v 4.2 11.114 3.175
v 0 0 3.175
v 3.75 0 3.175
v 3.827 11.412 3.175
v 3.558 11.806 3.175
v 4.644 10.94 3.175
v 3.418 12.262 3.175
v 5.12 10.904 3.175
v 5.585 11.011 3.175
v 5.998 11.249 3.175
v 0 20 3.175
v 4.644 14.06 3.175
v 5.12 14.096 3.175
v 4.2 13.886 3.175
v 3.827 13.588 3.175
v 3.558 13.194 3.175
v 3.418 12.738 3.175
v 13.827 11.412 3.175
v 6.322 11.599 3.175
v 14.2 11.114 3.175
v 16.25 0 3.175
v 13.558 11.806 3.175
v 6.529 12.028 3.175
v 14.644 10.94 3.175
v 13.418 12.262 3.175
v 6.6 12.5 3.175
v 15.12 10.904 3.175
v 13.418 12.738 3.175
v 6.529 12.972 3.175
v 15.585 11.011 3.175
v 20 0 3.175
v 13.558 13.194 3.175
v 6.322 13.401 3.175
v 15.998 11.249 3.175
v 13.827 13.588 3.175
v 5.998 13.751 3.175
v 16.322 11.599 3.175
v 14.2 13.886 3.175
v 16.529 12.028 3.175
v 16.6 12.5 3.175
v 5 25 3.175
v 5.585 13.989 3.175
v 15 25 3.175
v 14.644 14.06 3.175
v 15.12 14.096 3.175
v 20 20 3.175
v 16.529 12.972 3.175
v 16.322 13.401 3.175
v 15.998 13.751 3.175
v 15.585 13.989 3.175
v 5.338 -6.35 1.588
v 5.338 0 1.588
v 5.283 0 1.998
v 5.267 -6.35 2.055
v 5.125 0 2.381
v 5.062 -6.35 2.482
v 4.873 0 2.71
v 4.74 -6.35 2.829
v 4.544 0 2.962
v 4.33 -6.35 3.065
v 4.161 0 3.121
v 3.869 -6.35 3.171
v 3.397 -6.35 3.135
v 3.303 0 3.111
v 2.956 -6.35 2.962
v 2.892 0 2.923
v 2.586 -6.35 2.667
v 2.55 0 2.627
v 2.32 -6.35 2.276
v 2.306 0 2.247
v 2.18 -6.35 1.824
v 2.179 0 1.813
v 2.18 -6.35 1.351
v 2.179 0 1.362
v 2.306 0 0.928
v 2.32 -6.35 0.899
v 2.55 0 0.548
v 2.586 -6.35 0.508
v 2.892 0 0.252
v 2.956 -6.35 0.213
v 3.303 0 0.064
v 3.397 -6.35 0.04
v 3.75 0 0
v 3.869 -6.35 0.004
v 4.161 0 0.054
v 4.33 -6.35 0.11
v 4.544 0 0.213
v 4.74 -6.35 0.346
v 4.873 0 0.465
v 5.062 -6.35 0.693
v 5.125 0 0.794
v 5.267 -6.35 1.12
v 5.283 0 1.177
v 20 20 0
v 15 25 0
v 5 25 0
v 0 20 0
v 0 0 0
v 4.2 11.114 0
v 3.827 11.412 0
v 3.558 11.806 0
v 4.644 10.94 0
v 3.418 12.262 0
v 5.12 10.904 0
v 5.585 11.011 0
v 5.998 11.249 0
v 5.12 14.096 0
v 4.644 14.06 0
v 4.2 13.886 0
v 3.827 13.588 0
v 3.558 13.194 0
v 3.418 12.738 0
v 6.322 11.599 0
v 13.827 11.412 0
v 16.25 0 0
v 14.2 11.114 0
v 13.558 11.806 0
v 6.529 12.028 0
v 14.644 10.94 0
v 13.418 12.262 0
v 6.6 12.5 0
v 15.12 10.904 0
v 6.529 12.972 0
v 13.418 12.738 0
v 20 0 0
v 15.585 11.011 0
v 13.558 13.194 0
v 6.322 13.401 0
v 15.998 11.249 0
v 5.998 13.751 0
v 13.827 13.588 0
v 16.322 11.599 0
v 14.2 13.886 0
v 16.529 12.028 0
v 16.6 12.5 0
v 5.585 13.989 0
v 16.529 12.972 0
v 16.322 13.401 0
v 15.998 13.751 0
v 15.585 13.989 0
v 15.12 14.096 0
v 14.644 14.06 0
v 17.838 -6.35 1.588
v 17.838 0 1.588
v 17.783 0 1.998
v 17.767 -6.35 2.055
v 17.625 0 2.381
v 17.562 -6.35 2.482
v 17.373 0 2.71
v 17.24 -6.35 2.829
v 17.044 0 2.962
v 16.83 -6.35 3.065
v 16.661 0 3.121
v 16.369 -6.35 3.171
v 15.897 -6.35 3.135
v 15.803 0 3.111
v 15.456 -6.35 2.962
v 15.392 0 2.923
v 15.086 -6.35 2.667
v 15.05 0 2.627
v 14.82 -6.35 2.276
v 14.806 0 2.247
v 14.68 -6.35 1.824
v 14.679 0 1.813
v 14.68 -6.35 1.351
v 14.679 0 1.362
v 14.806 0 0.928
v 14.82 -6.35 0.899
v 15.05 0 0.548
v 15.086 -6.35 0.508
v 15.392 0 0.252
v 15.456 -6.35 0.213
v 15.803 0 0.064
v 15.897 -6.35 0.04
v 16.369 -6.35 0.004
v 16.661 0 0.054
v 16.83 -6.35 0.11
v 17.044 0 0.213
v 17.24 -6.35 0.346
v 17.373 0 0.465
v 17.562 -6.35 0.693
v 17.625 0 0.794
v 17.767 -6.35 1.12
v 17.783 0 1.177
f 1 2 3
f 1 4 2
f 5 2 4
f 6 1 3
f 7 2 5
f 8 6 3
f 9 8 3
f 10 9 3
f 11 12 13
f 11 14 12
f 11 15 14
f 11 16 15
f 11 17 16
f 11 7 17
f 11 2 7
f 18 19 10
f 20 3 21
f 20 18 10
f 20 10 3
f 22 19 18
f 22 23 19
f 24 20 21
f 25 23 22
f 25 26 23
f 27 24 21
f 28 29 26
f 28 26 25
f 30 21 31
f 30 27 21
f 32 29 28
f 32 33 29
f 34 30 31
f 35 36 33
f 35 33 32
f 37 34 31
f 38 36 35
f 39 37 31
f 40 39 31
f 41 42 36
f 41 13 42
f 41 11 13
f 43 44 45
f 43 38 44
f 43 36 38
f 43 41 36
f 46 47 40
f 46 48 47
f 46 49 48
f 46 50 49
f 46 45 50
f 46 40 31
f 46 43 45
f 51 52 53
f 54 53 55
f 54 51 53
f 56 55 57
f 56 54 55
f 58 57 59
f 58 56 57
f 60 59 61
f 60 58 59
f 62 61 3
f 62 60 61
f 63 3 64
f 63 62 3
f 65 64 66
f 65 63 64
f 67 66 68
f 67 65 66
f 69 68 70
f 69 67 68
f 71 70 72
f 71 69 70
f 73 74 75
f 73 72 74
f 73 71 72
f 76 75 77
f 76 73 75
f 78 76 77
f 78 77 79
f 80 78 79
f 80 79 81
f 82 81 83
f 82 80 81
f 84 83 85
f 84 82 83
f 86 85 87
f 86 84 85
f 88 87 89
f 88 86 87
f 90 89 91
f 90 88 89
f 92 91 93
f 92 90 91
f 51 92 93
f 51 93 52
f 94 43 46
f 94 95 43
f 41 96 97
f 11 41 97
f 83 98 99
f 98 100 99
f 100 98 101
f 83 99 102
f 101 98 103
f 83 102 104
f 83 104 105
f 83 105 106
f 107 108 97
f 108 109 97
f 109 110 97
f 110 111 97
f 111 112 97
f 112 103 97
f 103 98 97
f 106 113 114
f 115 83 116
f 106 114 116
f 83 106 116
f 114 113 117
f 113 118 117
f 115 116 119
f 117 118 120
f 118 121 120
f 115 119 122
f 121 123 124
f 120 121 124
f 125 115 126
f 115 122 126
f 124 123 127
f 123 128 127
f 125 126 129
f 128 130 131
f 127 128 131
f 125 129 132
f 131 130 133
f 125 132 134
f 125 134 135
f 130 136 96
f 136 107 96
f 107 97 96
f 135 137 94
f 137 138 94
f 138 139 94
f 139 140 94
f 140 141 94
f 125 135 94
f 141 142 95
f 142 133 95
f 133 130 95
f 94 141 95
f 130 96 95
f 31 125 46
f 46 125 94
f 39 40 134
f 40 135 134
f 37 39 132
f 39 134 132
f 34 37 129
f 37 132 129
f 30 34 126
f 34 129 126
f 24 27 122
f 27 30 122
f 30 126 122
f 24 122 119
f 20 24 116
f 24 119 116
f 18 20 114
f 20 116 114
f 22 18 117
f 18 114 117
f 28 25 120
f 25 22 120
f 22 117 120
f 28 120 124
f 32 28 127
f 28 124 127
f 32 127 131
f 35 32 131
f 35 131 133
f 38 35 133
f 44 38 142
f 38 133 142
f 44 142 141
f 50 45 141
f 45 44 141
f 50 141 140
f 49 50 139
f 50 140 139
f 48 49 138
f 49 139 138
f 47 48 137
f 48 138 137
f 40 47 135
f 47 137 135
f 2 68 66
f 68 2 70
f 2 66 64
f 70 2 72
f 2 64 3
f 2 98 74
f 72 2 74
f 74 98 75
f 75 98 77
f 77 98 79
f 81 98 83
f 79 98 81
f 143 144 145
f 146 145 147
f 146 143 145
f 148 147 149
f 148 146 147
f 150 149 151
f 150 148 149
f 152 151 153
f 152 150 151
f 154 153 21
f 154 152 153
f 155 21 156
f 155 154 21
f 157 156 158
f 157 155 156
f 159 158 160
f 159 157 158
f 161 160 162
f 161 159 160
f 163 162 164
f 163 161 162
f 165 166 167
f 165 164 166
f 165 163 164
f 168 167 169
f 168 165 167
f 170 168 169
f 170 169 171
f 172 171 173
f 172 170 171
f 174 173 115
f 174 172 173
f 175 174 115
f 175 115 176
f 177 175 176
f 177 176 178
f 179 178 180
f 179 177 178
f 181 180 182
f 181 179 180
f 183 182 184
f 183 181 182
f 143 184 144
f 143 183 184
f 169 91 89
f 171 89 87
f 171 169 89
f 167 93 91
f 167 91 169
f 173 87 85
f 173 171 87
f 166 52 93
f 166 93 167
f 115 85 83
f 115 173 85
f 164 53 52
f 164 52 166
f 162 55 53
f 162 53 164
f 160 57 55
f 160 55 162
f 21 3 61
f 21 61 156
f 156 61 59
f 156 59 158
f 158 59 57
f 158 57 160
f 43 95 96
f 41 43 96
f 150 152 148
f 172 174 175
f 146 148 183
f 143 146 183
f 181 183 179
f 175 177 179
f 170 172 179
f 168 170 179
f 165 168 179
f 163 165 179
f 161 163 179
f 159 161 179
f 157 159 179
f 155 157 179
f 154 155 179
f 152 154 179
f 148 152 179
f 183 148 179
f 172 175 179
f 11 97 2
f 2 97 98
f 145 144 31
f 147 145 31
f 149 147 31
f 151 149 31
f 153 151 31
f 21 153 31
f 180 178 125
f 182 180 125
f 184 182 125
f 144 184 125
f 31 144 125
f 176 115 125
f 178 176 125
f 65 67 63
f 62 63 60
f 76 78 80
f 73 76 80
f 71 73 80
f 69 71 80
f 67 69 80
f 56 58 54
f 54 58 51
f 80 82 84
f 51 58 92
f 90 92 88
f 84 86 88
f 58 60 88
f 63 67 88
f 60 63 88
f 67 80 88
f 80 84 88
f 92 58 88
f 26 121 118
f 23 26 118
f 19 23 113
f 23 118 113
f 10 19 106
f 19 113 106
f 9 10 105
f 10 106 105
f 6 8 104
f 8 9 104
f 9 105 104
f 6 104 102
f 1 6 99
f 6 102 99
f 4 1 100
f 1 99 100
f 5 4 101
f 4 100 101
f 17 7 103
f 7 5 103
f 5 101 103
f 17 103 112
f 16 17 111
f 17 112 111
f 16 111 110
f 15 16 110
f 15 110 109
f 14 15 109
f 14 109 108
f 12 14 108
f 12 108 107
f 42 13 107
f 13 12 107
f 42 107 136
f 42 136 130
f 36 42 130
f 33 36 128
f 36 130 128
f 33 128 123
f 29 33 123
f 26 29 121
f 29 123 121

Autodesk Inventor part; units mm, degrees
ref_plane "YZ Plane" through (0, 0, 0) normal (1, 0, 0) x (0, 1, 0)
ref_plane "XZ Plane" through (0, 0, 0) normal (0, 1, 0) x (-1, 0, 0)
ref_plane "XY Plane" through (0, 0, 0) normal (0, 0, 1) x (1, 0, 0)
sketch "Sketch1" plane through (0, 0, 0) normal (0, 0, 1) x (1, 0, 0)
  line L0 (0, 0) -> (20, 0)
  line L1 (20, 0) -> (20, 20)
  line L2 (15, 25) -> (5, 25)
  line L3 (0, 20) -> (0, 0)
  circle A0 centre (5, 12.5) radius 1.6
  circle A1 centre (15, 12.5) radius 1.6
  line L4 (5, 25) -> (0, 20)
  line L5 (15, 25) -> (20, 20)
  line L6 (2.1625, 0) -> (2.1625, -6.35)
  line L7 (2.1625, -6.35) -> (5.3375, -6.35)
  line L8 (5.3375, -6.35) -> (5.3375, 0)
  line L9 (14.6625, 0) -> (14.6625, -6.35)
  line L10 (14.6625, -6.35) -> (17.8375, -6.35)
  line L11 (17.8375, -6.35) -> (17.8375, 0)
  point P0 (20, 25)
  point P1 (0, 25)
  dimension "d0" = 25
  dimension "d1" = 20
  dimension "d2" = 3.2
  dimension "d3" = 5
  dimension "d4" = 12.5
  dimension "d7" = 5
  dimension "d8" = 12.5
  dimension "d9" = 5
  dimension "d10" = 5
  dimension "d11" = 5
  dimension "d12" = 5
  dimension "d13" = 3.175
  dimension "d14" = 6.35
  dimension "d15" = 9.325
  dimension "d16" = 2.1625
  dimension "d17" = 2.1625
extrude "Extrusion1" add sketch "Sketch1" along normal blind 3.175
sketch "Sketch2" plane through (14.6625, -6.35, 0) normal (0, -1, 0) x (1, 0, 0)
  line L0 (0, 0) -> (3.175, 0) projected
  line L1 (3.175, 0) -> (3.175, 3.175) projected
  line L2 (0, 3.175) -> (3.175, 3.175) projected
  line L3 (0, 0) -> (0, 3.175) projected
  circle A0 centre (1.5875, 1.5875) radius 1.5875
  point P0 (-14.6625, 0)
extrude "Extrusion2" cut sketch "Sketch2" against normal blind 6.35 contours L3 A0 L0 | A0 L1 L0 | L3 L2 A0 | A0 L2 L1
sketch "Sketch3" plane through (2.1625, -6.35, 0) normal (0, -1, 0) x (1, 0, 0)
  line L0 (0, 0) -> (3.175, 0) projected
  line L1 (3.175, 0) -> (3.175, 3.175) projected
  line L2 (0, 3.175) -> (3.175, 3.175) projected
  line L3 (0, 0) -> (0, 3.175) projected
  circle A0 centre (1.5875, 1.5875) radius 1.5875
  point P0 (-2.1625, 0)
extrude "Extrusion3" cut sketch "Sketch3" against normal blind 6.35 contours L3 A0 L0 | A0 L1 L0 | L3 L2 A0 | A0 L2 L1
equation "\"d7\" = d3"
equation "\"d8\" = d4"
equation "\"d10\" = d9"
equation "\"d11\" = d9"
equation "\"d12\" = d11"
equation "\"d16\" = d17"
properties part number "Effector_ZProbe_A"
